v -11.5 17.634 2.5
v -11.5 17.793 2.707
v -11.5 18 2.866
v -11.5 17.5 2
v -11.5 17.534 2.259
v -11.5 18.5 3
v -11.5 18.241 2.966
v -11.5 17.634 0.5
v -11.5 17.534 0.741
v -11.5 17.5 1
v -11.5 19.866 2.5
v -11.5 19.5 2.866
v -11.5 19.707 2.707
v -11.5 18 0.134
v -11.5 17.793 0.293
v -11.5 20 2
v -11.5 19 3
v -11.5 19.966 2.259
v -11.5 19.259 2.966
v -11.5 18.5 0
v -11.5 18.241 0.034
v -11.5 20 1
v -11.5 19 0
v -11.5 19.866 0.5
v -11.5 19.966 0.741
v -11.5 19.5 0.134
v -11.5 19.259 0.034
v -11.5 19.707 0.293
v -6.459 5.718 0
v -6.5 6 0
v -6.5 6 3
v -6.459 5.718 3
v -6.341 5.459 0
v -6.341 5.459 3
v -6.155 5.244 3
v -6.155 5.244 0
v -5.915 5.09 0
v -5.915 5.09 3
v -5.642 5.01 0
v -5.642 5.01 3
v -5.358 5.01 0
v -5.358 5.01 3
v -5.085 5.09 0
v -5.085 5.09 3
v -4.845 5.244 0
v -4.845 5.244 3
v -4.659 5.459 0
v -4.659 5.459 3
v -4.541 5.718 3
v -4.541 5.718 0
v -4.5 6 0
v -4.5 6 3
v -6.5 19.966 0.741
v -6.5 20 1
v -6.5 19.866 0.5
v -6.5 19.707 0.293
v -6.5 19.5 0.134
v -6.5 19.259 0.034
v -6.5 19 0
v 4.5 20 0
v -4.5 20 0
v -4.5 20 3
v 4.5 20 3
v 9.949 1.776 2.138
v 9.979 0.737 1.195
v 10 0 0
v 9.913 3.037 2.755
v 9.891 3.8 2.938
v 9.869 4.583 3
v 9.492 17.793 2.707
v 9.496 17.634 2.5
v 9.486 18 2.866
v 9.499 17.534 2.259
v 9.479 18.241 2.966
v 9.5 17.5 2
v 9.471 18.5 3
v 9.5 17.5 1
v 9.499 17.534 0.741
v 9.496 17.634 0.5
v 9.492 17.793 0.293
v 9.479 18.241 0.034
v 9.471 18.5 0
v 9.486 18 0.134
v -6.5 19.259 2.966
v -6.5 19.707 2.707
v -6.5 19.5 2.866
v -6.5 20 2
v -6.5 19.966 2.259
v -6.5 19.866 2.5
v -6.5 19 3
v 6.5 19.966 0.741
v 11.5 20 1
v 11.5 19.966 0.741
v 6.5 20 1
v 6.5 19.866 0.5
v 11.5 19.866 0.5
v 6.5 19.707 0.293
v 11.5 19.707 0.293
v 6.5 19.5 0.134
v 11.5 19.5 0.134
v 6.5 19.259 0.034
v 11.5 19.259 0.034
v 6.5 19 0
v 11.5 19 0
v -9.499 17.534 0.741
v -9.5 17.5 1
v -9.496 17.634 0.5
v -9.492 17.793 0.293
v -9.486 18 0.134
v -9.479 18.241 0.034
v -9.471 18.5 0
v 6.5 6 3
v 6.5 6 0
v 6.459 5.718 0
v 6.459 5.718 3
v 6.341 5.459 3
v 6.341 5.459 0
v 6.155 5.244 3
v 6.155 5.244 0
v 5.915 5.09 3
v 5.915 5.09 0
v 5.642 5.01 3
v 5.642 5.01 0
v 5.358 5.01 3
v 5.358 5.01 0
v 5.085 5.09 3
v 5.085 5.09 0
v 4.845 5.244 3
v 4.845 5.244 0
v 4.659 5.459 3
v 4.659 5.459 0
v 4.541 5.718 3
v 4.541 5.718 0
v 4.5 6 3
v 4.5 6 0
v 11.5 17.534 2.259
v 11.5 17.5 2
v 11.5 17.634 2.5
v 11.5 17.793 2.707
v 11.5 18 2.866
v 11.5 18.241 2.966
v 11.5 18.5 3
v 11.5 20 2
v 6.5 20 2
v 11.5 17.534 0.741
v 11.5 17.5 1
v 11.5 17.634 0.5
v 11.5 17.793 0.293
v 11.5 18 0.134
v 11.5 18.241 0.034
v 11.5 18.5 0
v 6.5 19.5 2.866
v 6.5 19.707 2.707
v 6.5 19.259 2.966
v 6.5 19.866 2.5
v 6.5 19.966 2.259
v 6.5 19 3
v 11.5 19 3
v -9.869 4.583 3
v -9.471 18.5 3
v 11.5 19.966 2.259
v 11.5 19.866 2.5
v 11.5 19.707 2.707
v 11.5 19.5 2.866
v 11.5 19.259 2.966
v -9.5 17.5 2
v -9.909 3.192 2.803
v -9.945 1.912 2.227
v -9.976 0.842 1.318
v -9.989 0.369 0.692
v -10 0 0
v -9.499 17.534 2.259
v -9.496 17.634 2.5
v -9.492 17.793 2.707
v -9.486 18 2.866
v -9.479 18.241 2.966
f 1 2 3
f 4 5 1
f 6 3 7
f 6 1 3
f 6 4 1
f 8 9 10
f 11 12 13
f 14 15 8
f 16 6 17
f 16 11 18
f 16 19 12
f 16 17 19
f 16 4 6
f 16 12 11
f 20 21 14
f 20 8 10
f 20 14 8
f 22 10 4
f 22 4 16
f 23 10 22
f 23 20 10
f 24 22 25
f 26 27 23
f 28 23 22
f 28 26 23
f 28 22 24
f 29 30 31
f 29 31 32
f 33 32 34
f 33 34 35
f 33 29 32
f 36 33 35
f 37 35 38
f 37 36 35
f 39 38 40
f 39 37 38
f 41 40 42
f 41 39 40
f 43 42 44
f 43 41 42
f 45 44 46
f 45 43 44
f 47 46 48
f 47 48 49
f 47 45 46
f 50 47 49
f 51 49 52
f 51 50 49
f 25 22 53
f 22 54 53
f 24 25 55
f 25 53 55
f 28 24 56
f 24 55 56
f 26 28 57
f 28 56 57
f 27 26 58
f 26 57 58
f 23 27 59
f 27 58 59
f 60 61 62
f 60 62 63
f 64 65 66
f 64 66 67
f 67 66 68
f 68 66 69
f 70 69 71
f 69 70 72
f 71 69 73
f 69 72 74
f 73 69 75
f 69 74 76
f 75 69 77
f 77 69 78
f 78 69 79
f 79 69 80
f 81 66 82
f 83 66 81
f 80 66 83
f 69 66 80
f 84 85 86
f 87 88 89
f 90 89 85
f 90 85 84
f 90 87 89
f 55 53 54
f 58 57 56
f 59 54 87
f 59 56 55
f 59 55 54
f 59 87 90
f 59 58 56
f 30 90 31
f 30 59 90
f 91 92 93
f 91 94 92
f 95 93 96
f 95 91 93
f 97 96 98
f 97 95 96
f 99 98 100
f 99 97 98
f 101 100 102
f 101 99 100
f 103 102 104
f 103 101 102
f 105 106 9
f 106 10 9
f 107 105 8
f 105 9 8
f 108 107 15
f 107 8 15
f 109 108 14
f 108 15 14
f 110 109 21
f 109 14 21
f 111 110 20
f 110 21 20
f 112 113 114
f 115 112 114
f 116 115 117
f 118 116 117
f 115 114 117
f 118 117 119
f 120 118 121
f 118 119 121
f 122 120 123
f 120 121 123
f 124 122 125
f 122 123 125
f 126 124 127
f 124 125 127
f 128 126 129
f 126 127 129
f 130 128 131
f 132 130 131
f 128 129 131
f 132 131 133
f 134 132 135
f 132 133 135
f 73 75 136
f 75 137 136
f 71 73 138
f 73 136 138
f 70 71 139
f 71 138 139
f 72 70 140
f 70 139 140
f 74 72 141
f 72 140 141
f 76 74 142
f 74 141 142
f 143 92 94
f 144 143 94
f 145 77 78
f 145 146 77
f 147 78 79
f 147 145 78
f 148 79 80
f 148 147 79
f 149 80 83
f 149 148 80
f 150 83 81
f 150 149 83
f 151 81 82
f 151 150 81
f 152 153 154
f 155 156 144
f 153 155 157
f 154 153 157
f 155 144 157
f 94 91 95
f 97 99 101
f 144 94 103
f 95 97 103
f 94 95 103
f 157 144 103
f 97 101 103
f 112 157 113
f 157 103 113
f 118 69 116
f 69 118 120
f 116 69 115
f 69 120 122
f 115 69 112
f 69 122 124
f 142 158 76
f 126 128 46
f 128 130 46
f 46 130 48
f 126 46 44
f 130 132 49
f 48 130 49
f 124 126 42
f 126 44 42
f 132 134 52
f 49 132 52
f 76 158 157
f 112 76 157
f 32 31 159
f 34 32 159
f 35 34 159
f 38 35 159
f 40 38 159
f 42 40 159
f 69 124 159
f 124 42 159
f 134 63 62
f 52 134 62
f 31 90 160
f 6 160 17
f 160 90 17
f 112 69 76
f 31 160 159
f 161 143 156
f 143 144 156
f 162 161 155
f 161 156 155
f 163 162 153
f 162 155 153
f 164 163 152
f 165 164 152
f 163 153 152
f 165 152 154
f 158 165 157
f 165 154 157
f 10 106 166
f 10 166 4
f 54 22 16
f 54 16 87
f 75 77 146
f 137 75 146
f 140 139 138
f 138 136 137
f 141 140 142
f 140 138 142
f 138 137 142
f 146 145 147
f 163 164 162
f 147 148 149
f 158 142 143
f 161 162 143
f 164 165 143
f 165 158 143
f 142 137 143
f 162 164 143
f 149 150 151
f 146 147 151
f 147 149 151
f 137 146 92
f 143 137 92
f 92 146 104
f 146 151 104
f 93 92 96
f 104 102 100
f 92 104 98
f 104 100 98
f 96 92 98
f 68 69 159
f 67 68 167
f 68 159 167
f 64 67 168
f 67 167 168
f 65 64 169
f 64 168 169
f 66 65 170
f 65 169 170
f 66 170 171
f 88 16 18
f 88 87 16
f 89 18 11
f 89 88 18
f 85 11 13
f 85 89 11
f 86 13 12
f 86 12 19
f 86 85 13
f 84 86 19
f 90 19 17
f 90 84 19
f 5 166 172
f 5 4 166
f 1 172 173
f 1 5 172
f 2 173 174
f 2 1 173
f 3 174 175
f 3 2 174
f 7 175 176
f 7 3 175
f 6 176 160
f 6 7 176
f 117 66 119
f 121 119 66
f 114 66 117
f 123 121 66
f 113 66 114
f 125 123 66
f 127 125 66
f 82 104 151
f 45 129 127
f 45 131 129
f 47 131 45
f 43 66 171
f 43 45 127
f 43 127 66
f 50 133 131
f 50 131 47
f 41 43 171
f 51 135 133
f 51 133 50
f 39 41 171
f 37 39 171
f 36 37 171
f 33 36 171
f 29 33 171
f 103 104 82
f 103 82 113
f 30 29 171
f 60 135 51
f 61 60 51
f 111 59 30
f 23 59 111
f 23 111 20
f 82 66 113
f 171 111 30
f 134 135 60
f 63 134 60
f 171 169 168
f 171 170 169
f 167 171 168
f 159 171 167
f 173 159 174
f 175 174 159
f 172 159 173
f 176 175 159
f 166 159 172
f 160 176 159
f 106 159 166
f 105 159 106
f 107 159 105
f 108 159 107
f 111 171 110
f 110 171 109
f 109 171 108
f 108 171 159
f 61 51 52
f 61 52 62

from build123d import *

# Parameters (mm, degrees)
F4_DEPTH    = 3
F1_R        = 1
F3_T1_DEPTH = 42.9128784748


# Not quite as in the source:
# - a fillet or chamfer that OpenCascade refuses, or shapes differently, is made with other operations: its cross-section is extruded or revolved along the edge and cut away or added


with BuildPart() as f4:
    # F0 (on Top) → F4 (new body)
    with BuildSketch(Plane.XY):
        with BuildLine():
            Line((0, 20), (0, 0))
            Line((0, 0), (10, 0))
            Line((10, 0), (9.5, 17.5))
            Line((9.5, 17.5), (11.5, 17.5))
            Line((11.5, 17.5), (11.5, 20))
            Line((11.5, 20), (6.5, 20))
            Line((6.5, 20), (6.5, 6))
            ThreePointArc((6.5, 6), (5.5, 5), (4.5, 6))
            Line((4.5, 6), (4.5, 20))
            Line((4.5, 20), (0, 20))
        make_face()
    extrude(amount=F4_DEPTH)

    # F1
    f1_edges = [f4.edges().sort_by_distance(p)[0] for p in [
        (10.5, 17.5, 3),
        (9, 20, 3),
        (10.5, 17.5, 0),
        (9, 20, 0),
    ]]
    fillet(f1_edges, radius=F1_R)

    # F2: F4 across plane


with BuildPart() as f4_1:
    add(f4.part)
    add(f4.part.mirror(Plane.YZ))

    # F3: fillet of radius 5 on 1 edges, made by hand

    # F3_s2 → F3_t1 (cut)
    with BuildSketch(Plane.YZ.offset(-21.4564392374)):
        with BuildLine():
            ThreePointArc((4.582575695, 3), (1.8439629074, 2.1833001327), (0, 0))
            Line((0, 0), (0, 3))
            Line((0, 3), (4.582575695, 3))
        make_face()
    extrude(amount=F3_T1_DEPTH, mode=Mode.SUBTRACT)


solid = f4_1.part
